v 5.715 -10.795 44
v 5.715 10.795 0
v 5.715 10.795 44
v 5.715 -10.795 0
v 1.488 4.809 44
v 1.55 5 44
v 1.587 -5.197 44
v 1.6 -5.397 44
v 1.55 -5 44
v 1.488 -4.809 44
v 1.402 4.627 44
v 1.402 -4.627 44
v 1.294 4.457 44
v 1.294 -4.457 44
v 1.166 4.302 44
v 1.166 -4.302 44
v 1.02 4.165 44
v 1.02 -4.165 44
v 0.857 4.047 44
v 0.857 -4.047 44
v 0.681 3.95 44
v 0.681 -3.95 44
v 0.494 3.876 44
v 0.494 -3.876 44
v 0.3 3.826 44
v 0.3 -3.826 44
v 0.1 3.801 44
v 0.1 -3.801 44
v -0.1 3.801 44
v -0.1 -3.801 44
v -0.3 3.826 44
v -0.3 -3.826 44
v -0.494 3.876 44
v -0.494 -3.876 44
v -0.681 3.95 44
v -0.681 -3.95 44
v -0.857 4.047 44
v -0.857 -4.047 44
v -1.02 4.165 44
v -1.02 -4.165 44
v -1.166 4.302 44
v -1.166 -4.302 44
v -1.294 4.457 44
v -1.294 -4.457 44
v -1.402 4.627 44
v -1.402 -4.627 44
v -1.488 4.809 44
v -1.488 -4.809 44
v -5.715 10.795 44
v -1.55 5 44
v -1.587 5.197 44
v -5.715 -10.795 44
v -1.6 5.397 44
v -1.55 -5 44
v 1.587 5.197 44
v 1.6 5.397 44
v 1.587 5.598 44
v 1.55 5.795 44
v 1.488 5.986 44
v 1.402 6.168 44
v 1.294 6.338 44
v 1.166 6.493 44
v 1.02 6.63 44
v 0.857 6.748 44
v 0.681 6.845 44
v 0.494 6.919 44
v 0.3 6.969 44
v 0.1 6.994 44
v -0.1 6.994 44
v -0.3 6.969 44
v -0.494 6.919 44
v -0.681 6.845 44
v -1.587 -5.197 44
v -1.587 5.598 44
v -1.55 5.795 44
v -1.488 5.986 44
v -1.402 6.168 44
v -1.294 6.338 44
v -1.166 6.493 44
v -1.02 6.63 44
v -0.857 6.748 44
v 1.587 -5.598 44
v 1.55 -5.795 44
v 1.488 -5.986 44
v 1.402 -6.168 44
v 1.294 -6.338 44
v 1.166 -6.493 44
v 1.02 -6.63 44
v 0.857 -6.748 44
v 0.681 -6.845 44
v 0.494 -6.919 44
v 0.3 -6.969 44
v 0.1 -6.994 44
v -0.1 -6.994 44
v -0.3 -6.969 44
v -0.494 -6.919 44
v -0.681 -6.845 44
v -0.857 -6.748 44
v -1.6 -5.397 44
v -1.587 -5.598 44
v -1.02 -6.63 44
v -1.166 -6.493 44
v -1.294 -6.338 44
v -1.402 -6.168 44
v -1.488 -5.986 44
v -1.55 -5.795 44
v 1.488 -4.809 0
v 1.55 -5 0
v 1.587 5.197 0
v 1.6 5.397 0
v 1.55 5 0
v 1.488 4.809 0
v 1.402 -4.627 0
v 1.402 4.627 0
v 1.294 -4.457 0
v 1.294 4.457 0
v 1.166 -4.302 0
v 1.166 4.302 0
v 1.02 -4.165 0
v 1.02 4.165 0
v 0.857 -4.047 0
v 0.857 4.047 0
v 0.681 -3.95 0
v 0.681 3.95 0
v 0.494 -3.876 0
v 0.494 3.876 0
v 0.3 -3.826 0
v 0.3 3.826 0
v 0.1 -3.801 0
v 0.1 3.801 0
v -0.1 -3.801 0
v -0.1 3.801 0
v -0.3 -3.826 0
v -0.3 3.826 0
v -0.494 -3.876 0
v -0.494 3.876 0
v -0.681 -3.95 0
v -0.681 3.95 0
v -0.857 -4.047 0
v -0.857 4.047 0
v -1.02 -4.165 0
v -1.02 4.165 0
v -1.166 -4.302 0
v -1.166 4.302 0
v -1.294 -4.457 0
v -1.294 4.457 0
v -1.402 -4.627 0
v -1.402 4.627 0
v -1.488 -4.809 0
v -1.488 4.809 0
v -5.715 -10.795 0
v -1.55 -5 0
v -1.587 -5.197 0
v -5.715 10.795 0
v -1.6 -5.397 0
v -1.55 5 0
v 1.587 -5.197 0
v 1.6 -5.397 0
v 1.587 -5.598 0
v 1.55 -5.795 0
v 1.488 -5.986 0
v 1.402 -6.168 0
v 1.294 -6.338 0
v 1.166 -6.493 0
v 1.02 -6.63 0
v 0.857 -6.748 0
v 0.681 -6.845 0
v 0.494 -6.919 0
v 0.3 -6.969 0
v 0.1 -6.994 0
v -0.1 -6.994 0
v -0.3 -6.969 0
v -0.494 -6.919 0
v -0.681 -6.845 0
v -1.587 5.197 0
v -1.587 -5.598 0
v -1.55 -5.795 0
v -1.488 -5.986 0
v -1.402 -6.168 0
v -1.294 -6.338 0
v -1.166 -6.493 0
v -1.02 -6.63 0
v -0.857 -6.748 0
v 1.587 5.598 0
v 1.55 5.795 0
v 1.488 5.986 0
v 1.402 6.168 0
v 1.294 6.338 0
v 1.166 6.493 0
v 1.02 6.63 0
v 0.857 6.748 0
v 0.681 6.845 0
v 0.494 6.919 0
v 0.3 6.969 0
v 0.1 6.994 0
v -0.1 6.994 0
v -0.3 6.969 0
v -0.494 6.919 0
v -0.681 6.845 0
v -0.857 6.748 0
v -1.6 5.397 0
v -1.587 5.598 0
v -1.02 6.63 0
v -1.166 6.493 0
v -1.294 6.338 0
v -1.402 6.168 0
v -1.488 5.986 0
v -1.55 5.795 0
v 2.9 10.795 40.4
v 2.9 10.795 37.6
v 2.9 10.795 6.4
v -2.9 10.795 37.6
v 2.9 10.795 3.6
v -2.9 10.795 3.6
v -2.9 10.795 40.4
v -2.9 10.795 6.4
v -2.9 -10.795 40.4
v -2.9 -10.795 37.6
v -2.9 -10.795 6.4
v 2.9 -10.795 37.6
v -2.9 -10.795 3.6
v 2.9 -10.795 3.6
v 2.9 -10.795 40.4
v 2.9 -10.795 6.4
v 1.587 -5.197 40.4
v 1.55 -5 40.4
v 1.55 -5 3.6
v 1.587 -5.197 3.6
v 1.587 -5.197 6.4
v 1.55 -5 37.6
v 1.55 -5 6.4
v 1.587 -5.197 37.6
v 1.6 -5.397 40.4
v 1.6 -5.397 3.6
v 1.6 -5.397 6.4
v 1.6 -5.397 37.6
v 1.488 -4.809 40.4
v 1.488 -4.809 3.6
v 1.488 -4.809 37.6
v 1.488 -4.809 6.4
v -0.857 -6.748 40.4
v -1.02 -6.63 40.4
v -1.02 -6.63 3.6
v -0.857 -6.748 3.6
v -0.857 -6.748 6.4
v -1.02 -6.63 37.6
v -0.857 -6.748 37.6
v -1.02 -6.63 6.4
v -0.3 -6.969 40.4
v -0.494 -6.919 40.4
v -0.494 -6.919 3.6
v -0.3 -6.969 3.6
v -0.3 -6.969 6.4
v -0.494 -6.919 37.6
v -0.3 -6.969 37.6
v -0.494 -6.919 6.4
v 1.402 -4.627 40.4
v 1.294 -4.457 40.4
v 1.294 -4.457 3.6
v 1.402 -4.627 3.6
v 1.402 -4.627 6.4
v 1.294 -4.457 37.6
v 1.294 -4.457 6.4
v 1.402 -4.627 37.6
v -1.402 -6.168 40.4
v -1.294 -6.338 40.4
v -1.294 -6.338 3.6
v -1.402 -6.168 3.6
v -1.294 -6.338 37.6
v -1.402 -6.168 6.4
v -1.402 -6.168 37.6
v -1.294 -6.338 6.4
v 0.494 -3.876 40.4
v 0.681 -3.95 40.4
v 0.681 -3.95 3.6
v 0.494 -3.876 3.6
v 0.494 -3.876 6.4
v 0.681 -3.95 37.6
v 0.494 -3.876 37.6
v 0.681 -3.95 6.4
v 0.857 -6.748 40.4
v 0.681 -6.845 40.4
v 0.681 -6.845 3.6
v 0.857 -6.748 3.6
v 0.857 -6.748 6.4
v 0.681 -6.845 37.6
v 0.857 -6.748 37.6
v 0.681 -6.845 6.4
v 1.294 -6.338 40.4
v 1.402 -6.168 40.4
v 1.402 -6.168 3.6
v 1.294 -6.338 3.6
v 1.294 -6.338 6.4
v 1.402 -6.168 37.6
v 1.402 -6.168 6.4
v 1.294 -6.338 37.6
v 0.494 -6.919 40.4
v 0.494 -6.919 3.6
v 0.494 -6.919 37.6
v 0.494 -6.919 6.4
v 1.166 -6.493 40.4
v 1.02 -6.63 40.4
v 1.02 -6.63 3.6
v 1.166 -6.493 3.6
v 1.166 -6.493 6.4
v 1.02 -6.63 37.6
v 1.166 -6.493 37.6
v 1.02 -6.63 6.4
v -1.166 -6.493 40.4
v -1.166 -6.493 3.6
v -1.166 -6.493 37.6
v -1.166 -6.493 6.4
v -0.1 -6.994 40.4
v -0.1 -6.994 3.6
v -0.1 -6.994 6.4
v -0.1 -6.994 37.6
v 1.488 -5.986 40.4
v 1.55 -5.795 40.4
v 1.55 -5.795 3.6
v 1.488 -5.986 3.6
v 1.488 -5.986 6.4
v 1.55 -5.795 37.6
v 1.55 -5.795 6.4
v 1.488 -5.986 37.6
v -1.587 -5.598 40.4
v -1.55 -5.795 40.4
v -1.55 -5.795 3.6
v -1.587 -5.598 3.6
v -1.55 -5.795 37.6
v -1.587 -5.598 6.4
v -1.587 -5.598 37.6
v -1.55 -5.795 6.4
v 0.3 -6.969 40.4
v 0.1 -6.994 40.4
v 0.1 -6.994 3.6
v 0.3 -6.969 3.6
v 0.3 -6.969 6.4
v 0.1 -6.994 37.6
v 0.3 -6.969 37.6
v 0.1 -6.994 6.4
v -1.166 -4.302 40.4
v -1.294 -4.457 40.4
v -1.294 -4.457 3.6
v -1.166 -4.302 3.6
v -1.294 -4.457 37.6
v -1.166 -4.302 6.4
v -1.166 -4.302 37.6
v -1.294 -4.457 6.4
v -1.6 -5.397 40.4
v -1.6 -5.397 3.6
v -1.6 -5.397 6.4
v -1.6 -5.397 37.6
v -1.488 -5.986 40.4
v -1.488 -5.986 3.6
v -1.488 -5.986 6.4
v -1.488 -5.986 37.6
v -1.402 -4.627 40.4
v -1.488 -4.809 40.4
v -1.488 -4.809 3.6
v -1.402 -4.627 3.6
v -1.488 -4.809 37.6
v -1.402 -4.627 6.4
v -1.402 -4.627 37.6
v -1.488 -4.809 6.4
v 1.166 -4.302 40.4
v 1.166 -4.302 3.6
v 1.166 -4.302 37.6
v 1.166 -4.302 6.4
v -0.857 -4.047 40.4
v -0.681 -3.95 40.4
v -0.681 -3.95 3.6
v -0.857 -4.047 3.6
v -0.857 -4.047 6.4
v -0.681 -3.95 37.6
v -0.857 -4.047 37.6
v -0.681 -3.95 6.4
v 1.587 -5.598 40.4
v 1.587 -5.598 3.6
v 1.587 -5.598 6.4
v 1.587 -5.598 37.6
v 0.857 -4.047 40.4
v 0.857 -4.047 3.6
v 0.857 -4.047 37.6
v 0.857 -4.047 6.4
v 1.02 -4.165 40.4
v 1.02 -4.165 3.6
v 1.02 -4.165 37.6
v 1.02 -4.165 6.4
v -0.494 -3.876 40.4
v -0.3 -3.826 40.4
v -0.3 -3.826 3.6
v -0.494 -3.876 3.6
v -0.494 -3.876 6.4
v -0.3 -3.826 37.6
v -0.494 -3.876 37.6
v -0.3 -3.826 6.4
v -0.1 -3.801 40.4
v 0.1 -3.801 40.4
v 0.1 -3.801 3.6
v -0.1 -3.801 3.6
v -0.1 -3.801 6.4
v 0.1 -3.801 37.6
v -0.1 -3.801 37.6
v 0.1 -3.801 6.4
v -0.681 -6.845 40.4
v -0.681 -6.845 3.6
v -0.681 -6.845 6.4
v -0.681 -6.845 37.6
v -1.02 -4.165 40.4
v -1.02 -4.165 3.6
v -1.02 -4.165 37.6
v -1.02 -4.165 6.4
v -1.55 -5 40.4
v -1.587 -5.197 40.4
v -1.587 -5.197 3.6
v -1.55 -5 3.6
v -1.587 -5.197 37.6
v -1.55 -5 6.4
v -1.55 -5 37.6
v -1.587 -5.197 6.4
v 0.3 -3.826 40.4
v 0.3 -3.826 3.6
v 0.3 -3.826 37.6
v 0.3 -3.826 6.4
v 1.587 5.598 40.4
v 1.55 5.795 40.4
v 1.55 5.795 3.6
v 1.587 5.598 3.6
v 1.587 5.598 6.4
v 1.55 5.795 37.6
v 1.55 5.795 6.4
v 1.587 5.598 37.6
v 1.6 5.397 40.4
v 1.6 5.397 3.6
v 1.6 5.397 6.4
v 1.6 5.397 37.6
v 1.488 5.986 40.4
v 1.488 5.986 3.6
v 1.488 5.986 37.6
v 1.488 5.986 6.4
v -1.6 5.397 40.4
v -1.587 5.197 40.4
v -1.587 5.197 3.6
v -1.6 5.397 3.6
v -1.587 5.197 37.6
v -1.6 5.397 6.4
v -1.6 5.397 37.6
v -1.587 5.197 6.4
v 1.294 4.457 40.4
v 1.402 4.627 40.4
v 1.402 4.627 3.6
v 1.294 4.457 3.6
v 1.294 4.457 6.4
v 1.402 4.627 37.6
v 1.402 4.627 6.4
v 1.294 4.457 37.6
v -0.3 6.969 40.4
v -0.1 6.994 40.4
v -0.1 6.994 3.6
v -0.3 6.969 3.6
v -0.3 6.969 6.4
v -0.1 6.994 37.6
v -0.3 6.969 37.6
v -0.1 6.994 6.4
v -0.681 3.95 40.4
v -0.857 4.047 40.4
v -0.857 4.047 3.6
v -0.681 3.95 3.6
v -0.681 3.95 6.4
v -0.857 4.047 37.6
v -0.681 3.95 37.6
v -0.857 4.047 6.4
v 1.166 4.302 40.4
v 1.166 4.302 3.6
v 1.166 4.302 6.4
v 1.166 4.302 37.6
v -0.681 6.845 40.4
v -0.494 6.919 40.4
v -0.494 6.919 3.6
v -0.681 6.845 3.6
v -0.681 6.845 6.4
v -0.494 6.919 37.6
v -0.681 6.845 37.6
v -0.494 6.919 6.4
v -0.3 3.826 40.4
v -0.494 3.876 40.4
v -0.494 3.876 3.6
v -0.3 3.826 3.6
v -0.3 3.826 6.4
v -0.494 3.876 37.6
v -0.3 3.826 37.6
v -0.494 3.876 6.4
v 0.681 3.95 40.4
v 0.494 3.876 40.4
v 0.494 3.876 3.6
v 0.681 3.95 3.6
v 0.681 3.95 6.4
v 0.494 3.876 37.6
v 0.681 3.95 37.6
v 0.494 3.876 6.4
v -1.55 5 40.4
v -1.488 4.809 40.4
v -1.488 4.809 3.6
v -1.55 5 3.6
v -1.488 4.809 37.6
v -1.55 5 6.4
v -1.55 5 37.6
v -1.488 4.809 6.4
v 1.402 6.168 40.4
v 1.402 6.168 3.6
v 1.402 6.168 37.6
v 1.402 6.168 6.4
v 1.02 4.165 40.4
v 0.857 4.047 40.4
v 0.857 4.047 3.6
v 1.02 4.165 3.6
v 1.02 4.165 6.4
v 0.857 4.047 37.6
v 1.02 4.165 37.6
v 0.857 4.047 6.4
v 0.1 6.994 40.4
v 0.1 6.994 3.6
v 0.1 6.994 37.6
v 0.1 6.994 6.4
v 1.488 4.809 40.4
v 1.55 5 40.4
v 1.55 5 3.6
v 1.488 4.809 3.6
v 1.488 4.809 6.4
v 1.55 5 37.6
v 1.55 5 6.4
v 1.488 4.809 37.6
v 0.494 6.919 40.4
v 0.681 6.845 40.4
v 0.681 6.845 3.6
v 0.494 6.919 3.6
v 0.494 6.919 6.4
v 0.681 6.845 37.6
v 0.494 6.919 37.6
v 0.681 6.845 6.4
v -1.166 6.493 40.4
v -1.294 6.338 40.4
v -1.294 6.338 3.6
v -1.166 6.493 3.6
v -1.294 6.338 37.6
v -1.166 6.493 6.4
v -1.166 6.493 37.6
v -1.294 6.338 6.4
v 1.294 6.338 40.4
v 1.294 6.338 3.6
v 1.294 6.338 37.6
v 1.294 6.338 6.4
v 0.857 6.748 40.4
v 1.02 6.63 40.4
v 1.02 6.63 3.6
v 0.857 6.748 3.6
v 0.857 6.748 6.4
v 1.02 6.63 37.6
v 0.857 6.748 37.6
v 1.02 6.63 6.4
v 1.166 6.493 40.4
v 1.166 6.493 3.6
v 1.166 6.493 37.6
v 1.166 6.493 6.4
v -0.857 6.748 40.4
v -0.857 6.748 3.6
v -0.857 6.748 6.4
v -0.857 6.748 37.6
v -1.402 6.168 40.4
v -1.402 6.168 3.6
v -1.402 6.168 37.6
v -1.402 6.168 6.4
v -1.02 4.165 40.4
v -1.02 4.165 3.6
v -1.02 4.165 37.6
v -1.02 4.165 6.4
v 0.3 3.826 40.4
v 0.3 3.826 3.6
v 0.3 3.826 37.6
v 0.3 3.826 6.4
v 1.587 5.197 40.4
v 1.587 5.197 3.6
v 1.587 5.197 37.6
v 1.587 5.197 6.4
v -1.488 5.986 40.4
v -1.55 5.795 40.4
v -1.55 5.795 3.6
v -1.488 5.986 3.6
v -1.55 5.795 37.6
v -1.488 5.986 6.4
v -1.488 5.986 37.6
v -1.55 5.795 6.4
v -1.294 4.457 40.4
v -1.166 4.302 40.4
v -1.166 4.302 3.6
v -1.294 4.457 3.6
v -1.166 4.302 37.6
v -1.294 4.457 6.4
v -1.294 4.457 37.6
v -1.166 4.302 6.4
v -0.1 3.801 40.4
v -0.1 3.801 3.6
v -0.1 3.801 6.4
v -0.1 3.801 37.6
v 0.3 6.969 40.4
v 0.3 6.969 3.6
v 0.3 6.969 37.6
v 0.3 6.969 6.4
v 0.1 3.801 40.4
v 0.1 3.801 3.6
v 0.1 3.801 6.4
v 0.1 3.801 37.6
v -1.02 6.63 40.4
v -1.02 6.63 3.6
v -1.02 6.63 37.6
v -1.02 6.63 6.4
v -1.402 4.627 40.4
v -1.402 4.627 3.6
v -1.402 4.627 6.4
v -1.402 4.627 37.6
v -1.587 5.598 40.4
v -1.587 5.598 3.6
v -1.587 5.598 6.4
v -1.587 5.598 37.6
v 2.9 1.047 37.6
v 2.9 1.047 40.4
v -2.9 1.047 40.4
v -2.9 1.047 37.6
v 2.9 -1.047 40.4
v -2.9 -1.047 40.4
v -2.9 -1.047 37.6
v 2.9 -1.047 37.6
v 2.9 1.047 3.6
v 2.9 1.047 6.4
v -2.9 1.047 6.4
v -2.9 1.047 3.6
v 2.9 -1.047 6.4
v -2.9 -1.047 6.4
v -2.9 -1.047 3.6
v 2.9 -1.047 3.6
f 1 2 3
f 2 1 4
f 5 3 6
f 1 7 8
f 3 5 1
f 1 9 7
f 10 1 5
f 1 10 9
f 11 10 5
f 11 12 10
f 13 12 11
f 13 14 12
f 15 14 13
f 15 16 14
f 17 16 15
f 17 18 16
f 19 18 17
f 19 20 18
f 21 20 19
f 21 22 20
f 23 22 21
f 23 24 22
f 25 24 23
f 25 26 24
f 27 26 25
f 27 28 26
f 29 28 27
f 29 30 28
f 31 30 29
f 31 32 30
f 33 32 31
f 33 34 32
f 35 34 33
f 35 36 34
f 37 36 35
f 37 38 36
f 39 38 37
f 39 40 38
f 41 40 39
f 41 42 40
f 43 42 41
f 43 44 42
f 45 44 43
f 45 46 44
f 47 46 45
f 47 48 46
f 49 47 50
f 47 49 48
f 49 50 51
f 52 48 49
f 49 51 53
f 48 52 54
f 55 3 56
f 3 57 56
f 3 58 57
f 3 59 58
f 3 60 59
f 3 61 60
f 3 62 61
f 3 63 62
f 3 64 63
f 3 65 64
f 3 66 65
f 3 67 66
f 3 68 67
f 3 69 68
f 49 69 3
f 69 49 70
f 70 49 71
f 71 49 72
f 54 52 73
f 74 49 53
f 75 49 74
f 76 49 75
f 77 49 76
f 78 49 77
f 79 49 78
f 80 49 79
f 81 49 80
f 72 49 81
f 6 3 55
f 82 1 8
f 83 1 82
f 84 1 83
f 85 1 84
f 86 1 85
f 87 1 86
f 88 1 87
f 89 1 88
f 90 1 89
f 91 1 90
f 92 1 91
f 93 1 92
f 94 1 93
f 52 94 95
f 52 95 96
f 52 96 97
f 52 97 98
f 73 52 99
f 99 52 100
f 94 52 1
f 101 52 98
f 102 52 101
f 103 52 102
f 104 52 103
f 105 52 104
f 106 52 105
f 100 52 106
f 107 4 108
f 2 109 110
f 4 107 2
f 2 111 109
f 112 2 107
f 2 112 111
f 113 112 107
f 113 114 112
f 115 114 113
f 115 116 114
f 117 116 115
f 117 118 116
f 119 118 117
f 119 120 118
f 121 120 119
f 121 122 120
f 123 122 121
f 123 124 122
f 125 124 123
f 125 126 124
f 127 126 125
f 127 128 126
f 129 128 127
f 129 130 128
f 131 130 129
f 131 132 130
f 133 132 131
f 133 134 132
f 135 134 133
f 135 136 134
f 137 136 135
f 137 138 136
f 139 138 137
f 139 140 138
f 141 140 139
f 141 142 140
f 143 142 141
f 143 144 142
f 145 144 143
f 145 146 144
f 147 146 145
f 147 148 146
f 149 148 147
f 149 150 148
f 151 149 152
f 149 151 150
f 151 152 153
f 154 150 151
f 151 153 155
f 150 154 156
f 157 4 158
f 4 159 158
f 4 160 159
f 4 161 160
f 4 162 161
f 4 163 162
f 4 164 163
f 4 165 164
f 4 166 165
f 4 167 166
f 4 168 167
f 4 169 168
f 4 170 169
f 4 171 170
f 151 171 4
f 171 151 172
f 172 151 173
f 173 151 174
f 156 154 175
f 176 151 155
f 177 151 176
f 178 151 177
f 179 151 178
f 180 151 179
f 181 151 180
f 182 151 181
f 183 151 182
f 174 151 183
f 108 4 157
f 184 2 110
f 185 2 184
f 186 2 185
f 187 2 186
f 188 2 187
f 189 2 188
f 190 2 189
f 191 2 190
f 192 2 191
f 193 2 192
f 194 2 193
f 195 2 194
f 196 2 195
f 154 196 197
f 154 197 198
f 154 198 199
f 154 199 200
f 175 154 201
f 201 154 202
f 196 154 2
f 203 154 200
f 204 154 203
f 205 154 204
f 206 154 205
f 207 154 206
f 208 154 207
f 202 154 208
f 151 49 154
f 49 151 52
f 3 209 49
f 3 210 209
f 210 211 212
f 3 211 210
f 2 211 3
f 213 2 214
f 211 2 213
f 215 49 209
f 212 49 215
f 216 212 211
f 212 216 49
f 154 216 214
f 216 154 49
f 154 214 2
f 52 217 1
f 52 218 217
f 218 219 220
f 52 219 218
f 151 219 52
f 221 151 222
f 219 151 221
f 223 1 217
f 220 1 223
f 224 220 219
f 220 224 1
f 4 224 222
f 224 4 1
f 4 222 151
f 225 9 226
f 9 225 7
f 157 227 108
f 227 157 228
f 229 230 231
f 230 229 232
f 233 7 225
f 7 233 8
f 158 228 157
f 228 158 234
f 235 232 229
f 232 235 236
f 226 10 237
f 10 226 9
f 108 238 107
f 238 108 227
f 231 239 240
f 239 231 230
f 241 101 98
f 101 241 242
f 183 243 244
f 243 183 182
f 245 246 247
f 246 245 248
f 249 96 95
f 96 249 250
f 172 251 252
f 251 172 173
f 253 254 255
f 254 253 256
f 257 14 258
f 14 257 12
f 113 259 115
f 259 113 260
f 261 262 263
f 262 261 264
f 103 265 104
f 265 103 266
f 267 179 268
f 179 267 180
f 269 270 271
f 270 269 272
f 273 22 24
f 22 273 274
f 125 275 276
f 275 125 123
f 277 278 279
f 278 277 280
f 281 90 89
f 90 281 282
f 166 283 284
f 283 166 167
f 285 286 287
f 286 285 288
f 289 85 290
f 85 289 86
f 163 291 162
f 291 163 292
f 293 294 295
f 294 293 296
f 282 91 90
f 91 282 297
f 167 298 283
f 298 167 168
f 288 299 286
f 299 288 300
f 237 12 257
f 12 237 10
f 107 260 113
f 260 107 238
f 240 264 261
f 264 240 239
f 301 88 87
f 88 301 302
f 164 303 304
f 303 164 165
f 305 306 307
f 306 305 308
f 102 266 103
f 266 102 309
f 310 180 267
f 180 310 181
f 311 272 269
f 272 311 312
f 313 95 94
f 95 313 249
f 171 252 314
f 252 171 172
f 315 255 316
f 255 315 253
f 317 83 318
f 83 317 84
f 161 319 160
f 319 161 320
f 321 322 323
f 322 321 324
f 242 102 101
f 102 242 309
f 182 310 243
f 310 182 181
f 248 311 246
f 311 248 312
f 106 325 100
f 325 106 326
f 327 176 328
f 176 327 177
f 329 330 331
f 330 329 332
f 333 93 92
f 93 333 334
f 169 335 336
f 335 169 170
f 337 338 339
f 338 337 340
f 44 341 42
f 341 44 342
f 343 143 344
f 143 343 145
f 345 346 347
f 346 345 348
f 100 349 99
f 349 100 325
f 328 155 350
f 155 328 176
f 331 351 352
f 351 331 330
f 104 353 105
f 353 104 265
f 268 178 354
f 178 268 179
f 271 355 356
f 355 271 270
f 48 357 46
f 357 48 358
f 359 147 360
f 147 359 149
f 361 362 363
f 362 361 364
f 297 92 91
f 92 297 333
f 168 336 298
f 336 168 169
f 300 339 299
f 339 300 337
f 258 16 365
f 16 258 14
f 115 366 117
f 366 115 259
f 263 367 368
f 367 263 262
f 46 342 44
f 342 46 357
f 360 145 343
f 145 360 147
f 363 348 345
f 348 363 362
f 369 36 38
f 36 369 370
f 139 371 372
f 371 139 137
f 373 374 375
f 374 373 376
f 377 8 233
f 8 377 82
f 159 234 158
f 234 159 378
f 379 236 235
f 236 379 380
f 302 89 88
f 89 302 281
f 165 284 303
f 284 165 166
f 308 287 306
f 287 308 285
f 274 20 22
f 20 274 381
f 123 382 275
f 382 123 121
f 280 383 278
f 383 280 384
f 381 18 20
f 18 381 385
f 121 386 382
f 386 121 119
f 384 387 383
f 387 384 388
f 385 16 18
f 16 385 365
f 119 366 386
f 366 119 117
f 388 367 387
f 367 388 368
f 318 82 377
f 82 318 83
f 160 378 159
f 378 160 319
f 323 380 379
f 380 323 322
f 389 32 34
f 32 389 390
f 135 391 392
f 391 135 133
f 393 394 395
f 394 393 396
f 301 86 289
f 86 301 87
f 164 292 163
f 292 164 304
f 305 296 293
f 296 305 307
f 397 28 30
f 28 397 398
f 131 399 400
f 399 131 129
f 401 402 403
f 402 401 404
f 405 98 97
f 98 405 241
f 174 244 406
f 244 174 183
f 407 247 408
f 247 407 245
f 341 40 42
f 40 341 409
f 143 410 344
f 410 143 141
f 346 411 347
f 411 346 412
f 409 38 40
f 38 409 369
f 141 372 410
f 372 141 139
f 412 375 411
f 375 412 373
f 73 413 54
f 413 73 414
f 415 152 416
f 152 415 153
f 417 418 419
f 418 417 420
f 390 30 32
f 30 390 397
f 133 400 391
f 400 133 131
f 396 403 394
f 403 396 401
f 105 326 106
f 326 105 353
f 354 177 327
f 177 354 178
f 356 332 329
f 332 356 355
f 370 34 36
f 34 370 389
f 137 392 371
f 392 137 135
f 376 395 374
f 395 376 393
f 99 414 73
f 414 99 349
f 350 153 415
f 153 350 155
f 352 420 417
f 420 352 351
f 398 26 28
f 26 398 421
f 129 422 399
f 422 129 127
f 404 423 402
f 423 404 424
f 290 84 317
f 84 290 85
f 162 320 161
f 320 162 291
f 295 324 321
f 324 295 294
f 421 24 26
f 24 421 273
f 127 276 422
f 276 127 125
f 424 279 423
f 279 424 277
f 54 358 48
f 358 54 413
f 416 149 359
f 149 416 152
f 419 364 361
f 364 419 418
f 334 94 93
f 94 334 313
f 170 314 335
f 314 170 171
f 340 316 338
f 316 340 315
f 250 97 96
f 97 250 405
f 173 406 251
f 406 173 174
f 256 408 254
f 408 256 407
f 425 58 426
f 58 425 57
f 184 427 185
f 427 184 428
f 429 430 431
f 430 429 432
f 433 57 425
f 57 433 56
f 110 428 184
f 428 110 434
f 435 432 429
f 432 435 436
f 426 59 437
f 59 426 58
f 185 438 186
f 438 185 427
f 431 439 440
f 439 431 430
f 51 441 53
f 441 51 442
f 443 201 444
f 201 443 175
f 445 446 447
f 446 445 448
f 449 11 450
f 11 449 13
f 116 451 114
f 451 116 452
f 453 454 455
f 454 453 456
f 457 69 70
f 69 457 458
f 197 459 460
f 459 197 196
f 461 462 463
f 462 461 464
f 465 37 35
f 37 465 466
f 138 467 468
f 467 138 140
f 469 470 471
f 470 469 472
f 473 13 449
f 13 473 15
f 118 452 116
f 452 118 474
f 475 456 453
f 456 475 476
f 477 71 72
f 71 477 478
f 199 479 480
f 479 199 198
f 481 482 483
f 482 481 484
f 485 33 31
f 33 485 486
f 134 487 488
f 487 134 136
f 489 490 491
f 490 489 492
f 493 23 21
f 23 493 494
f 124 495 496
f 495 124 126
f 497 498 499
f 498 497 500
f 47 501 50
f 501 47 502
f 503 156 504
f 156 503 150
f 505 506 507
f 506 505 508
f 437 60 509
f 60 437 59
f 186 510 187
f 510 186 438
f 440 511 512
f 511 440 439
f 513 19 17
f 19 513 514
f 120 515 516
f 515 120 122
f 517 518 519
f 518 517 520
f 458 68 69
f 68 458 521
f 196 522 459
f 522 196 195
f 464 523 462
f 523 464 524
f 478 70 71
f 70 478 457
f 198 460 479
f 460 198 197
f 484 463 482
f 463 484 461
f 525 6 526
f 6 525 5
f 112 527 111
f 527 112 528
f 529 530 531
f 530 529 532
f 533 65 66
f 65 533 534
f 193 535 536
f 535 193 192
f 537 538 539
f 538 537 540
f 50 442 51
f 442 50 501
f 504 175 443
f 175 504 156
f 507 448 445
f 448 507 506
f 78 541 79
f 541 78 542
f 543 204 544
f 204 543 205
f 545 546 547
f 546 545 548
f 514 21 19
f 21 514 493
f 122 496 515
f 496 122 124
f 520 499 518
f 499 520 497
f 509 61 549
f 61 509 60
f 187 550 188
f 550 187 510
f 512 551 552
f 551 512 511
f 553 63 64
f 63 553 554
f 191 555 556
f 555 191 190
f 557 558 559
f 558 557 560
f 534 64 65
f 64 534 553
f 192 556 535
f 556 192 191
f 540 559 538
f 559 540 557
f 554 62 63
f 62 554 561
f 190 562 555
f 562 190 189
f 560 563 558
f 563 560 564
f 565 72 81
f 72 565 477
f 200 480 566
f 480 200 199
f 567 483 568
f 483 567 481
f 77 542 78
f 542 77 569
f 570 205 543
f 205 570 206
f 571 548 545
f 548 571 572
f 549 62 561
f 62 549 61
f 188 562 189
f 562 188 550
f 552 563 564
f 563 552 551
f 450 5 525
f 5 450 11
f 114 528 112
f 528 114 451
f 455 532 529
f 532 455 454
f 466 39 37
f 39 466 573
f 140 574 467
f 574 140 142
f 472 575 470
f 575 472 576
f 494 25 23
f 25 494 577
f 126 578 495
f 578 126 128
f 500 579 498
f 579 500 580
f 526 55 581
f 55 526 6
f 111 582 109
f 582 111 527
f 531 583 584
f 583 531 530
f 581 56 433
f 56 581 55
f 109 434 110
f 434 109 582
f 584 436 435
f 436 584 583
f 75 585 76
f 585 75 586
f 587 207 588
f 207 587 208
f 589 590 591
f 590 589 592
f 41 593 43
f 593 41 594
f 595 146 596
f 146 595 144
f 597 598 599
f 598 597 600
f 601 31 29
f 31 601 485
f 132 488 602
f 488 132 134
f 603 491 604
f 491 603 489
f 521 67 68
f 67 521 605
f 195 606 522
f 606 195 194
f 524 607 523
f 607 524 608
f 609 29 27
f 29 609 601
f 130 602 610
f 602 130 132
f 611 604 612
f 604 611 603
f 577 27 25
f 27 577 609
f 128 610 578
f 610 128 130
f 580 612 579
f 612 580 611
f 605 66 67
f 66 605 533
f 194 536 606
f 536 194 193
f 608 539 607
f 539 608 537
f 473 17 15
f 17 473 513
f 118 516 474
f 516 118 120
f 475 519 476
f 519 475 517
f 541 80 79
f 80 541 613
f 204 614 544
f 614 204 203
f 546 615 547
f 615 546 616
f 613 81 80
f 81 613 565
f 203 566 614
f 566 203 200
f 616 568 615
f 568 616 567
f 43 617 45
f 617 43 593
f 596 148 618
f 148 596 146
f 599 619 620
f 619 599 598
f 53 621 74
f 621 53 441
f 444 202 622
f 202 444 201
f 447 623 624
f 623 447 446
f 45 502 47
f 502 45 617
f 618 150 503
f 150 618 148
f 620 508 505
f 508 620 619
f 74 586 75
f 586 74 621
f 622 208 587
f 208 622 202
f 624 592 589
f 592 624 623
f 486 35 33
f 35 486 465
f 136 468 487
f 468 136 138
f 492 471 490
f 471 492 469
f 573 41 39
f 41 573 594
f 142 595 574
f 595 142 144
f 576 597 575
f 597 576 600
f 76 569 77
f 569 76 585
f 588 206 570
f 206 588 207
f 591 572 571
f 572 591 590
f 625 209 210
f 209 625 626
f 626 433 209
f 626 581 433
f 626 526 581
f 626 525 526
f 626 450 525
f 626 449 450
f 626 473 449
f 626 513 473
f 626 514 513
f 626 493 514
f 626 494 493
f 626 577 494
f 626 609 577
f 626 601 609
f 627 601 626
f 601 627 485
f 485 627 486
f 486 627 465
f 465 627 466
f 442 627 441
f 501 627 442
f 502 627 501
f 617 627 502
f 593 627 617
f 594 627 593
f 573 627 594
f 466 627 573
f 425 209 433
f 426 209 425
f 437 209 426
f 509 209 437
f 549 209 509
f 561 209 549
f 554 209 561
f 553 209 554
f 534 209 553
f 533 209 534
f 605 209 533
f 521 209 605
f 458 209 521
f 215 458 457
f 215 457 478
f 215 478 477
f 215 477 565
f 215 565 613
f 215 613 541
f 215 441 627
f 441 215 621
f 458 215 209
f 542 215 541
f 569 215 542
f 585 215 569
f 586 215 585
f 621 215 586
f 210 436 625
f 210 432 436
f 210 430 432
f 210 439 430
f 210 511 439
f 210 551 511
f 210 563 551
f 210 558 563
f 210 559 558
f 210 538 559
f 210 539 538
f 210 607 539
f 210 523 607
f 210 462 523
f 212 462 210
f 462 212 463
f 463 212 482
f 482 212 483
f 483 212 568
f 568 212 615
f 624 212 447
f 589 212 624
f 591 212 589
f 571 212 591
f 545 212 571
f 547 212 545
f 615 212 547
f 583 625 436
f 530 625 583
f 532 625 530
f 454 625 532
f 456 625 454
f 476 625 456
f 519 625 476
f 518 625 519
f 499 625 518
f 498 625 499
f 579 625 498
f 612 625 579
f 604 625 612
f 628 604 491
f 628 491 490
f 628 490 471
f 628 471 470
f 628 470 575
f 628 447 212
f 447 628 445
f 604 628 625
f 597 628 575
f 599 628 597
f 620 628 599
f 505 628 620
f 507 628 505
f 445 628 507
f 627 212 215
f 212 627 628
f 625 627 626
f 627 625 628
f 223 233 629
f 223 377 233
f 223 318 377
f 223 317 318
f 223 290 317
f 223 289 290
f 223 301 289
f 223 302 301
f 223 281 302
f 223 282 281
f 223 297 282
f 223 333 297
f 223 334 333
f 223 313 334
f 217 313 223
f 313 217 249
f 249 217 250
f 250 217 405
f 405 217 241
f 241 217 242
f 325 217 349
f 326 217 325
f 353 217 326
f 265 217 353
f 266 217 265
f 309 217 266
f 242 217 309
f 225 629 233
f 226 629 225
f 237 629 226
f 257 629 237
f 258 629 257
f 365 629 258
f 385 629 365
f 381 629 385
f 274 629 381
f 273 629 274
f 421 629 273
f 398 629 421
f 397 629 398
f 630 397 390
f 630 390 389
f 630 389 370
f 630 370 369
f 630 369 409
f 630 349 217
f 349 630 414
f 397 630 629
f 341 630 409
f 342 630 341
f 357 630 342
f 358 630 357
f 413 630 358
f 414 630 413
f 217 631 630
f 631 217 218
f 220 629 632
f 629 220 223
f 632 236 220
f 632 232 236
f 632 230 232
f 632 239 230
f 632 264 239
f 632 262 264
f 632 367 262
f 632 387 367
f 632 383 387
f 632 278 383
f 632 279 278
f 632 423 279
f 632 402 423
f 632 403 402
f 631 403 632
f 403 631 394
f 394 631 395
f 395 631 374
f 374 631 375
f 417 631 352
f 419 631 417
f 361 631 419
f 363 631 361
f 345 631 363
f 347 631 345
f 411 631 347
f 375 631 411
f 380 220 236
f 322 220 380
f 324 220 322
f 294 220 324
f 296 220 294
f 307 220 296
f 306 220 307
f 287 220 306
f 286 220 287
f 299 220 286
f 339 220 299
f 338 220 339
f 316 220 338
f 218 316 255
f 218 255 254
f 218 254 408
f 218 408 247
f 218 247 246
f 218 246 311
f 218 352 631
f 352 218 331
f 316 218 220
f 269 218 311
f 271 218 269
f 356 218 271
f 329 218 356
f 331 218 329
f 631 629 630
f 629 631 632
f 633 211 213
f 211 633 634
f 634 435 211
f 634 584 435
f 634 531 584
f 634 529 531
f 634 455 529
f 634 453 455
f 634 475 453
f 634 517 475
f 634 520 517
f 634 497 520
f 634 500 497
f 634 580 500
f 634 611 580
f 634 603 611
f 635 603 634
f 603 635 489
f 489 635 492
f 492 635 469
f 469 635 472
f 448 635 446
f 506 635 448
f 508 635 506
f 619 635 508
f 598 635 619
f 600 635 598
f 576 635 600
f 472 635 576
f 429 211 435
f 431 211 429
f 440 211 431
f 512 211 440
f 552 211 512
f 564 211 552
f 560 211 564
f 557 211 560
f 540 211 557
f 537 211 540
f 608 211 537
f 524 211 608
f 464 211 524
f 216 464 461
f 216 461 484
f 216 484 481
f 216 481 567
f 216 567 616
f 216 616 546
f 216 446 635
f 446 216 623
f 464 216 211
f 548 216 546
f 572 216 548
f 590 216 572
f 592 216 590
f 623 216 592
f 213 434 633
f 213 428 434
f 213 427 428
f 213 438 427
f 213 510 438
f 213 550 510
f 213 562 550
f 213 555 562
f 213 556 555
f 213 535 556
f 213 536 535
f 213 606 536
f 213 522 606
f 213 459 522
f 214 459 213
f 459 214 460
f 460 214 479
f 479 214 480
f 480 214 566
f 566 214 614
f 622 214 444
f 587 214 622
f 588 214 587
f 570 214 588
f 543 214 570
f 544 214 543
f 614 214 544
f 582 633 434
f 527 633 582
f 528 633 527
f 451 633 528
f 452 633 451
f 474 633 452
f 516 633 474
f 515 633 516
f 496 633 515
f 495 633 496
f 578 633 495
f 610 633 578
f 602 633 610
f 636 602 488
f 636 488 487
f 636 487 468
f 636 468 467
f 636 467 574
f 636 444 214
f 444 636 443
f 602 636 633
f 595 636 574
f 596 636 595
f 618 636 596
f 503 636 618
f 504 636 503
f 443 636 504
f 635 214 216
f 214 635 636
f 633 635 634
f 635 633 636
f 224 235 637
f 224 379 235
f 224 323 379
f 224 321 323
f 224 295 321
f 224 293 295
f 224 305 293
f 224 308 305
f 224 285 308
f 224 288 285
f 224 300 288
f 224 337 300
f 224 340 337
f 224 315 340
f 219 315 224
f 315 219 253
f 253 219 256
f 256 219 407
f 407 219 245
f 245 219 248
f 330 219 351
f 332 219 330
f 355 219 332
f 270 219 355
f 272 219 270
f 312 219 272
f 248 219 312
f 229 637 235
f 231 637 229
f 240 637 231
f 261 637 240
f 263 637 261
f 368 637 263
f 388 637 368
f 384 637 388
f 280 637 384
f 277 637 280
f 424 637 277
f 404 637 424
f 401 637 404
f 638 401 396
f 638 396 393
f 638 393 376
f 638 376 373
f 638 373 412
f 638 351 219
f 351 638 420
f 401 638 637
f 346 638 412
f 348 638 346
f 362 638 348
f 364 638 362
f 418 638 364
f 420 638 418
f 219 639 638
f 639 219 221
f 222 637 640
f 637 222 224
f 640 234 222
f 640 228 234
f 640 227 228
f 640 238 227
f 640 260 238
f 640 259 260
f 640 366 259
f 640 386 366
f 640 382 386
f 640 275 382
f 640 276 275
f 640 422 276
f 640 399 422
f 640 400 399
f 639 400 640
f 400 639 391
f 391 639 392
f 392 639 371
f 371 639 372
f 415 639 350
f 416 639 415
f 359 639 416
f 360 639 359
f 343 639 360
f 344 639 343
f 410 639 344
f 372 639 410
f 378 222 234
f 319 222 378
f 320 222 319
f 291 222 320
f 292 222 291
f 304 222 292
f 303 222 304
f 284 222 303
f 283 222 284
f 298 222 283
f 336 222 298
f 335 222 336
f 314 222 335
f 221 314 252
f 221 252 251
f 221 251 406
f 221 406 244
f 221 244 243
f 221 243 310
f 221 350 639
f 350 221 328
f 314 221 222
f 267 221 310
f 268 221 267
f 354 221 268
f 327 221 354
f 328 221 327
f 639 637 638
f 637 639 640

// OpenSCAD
// global parameters
thickness = 4;
delta=0.4;
raster =  2.54;
// motors
space = 42.0;// motor hight 
screwdim=3; // m3 screws
nut_width=5.4+delta;
nut_hight=2.4+delta;

wx = 4*raster+raster/2;
wy = 8*raster+raster/2;
wyp = (wy-nut_width)/4.0;
module mount(){
     //translate([0., 0., space/2  ])cube([10, 20, space+thickness/2], center=true);
     difference(){
          translate([-wx/2, -wy/2, 0])cube([wx, wy, space+thickness/2]);
          // holes
          translate([0, -wy/4, space+10])cylinder(h=50, r=screwdim/2+0.1, center=true, $fn=50);
          translate([0, +wy/4, space+10])cylinder(h=50, r=screwdim/2+0.1, center=true, $fn=50);
          translate([0, -wy/4, 10])cylinder(h=50, r=screwdim/2+0.1, center=true, $fn=50);
          translate([0, +wy/4, 10])cylinder(h=50, r=screwdim/2+0.1, center=true, $fn=50);
          // nuts 5.4mm x 2.4mm
          translate([0, +wy/4-nut_width/4, space-3])translate([-nut_width/2, -nut_width/2, -nut_hight/2])cube([nut_width, 4*nut_width, nut_hight], center=false);
          translate([0, -wy/4+nut_width/4, space-3])rotate([0,0,180])translate([-nut_width/2, -nut_width/2, -nut_hight/2])cube([nut_width, 4*nut_width, nut_hight], center=false);
          translate([0, +wy/4-nut_width/4, 5])translate([-nut_width/2, -nut_width/2, -nut_hight/2])cube([nut_width, 4*nut_width, nut_hight], center=false);
          translate([0, -wy/4+nut_width/4, 5])rotate([0,0,180])translate([-nut_width/2, -nut_width/2, -nut_hight/2])cube([nut_width, 4*nut_width, nut_hight], center=false);

     }
}
mount();
